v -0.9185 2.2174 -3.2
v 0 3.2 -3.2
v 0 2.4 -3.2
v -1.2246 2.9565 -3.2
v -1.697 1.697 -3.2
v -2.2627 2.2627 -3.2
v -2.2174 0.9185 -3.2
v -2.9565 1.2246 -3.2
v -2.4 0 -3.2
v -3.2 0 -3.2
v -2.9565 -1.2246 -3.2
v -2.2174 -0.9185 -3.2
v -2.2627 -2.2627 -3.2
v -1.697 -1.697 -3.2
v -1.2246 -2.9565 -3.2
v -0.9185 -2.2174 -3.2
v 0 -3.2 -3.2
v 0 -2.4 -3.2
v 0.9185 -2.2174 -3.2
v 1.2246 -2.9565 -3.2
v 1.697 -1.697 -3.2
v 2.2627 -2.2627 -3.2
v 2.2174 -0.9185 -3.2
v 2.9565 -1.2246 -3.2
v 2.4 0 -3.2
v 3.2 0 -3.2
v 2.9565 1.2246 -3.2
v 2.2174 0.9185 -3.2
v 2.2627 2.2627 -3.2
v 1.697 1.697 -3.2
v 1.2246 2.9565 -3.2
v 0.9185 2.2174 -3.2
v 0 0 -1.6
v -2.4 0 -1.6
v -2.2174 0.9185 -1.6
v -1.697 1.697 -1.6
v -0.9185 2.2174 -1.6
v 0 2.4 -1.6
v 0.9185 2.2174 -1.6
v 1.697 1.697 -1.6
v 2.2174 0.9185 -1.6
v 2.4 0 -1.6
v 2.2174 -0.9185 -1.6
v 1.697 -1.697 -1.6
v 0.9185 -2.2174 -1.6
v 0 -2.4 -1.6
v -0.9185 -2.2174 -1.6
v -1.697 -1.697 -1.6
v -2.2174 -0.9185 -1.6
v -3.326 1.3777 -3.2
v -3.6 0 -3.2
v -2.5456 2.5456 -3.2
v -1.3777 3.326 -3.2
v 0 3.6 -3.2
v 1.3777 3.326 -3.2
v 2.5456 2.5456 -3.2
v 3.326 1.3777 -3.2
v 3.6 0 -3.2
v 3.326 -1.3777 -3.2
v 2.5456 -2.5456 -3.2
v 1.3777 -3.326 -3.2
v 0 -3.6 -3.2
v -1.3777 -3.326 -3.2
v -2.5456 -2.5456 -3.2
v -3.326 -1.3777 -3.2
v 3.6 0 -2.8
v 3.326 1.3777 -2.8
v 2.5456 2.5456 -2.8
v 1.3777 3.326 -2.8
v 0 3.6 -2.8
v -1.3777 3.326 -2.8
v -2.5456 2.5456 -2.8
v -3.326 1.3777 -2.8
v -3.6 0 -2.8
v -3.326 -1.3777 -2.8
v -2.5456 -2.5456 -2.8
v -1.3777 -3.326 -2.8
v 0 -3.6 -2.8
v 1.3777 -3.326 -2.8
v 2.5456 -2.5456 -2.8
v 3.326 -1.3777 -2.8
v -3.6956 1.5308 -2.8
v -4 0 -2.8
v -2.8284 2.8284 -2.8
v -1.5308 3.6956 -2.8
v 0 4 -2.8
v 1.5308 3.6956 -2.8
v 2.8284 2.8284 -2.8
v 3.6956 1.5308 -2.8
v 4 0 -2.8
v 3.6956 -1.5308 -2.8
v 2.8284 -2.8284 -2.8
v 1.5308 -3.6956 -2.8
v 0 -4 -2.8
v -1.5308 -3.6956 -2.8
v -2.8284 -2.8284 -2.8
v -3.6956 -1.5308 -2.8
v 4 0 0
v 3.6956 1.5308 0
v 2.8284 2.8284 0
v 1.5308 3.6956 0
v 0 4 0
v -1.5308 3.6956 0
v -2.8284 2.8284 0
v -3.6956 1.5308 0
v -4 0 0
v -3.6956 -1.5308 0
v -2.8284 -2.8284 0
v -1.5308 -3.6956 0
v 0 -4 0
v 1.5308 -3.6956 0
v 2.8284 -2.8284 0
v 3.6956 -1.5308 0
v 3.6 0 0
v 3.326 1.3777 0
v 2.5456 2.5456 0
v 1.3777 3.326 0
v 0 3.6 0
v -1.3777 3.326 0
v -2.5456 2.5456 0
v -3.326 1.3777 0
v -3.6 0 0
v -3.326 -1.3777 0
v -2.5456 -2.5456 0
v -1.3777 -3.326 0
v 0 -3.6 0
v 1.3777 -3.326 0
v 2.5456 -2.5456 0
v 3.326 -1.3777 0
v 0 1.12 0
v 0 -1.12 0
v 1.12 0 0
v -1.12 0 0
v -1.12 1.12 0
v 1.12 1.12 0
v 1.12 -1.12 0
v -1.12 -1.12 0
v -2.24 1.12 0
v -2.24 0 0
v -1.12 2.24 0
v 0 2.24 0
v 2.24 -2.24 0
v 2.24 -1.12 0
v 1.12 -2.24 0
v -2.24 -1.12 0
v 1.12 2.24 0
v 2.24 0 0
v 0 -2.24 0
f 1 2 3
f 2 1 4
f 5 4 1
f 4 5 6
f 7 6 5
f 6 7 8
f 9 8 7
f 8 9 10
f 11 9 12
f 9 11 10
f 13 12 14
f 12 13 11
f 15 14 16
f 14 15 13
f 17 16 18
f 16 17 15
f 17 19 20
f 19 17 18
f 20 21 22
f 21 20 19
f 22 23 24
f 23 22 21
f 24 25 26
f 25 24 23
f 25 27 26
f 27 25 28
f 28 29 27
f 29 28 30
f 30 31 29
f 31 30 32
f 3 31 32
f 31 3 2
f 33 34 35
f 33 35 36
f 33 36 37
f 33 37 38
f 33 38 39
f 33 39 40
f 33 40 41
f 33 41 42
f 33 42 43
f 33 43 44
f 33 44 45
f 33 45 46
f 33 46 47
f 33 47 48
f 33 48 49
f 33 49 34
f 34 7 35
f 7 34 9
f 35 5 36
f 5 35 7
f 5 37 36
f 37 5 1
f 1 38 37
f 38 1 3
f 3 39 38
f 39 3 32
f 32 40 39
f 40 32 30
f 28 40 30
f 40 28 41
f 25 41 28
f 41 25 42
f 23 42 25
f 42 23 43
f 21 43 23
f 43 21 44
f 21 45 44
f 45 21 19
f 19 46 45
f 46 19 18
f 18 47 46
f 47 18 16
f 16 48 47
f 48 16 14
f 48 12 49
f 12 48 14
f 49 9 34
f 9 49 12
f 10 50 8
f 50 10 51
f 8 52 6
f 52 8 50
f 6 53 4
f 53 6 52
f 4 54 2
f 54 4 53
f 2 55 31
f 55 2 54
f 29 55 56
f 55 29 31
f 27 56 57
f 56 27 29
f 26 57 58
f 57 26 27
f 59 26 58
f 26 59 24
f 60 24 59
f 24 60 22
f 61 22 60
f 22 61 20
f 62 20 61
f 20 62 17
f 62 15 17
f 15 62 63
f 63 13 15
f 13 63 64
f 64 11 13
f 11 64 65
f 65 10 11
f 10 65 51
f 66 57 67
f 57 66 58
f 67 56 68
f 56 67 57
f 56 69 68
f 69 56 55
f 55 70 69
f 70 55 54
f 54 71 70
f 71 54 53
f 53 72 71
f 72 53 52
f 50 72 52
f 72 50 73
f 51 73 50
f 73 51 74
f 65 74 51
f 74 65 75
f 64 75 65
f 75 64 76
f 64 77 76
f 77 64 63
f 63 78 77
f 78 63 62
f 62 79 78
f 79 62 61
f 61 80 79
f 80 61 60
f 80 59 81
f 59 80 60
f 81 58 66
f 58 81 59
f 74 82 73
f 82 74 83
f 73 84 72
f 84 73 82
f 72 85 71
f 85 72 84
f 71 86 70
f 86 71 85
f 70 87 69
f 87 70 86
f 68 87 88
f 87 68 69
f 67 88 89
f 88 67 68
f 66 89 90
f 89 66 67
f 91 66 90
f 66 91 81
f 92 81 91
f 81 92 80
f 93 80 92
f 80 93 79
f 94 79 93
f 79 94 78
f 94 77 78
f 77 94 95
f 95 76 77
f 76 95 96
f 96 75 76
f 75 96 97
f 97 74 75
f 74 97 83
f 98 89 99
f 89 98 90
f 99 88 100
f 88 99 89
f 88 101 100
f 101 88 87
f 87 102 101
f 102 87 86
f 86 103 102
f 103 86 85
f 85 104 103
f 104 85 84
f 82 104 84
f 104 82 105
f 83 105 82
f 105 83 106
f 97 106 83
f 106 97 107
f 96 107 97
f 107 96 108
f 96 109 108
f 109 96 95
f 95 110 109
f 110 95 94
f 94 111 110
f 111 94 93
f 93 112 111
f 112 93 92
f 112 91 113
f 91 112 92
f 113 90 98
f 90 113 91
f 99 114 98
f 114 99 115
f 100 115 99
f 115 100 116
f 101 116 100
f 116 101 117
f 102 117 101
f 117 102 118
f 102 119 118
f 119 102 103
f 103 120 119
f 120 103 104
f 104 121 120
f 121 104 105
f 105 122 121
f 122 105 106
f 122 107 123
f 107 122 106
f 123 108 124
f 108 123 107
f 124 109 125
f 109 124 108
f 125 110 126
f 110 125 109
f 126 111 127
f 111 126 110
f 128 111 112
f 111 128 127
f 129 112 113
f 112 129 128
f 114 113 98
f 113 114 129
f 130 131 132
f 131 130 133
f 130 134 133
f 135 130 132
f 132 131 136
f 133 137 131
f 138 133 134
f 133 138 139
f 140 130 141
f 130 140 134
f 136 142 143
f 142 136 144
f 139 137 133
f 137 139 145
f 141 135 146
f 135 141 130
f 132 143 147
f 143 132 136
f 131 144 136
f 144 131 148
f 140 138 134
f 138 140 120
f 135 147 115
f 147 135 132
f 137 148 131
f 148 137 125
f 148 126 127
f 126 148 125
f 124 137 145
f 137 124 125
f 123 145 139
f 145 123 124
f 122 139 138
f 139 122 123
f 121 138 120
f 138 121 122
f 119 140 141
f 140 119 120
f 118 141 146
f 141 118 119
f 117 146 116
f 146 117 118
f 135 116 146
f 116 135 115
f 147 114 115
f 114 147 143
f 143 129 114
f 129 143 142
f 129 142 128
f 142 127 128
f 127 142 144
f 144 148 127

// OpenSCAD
// file: ../p/4-4disc.scad
use <../lib.scad>
function ldraw_lib__4_4disc() = [
// 0 Disc 1.0
// 0 Name: 4-4disc.dat
// 0 Author: James Jessiman
// 0 !LDRAW_ORG Primitive UPDATE 2002-02
// 0 !LICENSE Licensed under CC BY 4.0 : see CAreadme.txt
// 
// 0 BFC CERTIFY CCW
  [0,"BFC","CERTIFY"],
  [0,"BFC","CCW"],
// 
// 0 !HISTORY 1998-12-15 [PTadmin] Official Update 1998-10
// 0 !HISTORY 2002-03-23 [sbliss] Added BFC statement
// 0 !HISTORY 2002-04-25 [PTadmin] Official Update 2002-02
// 0 !HISTORY 2007-06-24 [PTadmin] Header formatted for Contributor Agreement
// 0 !HISTORY 2008-07-01 [PTadmin] Official Update 2008-01
// 
// 
// 3 16 0 0 0 1 0 0 0.9239 0 0.3827
  [3,16,0,0,0,1,0,0,0.9239,0,0.3827],
// 3 16 0 0 0 0.9239 0 0.3827 0.7071 0 0.7071
  [3,16,0,0,0,0.9239,0,0.3827,0.7071,0,0.7071],
// 3 16 0 0 0 0.7071 0 0.7071 0.3827 0 0.9239
  [3,16,0,0,0,0.7071,0,0.7071,0.3827,0,0.9239],
// 3 16 0 0 0 0.3827 0 0.9239 0 0 1
  [3,16,0,0,0,0.3827,0,0.9239,0,0,1],
// 3 16 0 0 0 0 0 1 -0.3827 0 0.9239
  [3,16,0,0,0,0,0,1,-0.3827,0,0.9239],
// 3 16 0 0 0 -0.3827 0 0.9239 -0.7071 0 0.7071
  [3,16,0,0,0,-0.3827,0,0.9239,-0.7071,0,0.7071],
// 3 16 0 0 0 -0.7071 0 0.7071 -0.9239 0 0.3827
  [3,16,0,0,0,-0.7071,0,0.7071,-0.9239,0,0.3827],
// 3 16 0 0 0 -0.9239 0 0.3827 -1 0 -0
  [3,16,0,0,0,-0.9239,0,0.3827,-1,0,-0],
// 3 16 0 0 0 -1 0 -0 -0.9239 0 -0.3827
  [3,16,0,0,0,-1,0,-0,-0.9239,0,-0.3827],
// 3 16 0 0 0 -0.9239 0 -0.3827 -0.7071 0 -0.7071
  [3,16,0,0,0,-0.9239,0,-0.3827,-0.7071,0,-0.7071],
// 3 16 0 0 0 -0.7071 0 -0.7071 -0.3827 0 -0.9239
  [3,16,0,0,0,-0.7071,0,-0.7071,-0.3827,0,-0.9239],
// 3 16 0 0 0 -0.3827 0 -0.9239 0 0 -1
  [3,16,0,0,0,-0.3827,0,-0.9239,0,0,-1],
// 3 16 0 0 0 0 0 -1 0.3827 0 -0.9239
  [3,16,0,0,0,0,0,-1,0.3827,0,-0.9239],
// 3 16 0 0 0 0.3827 0 -0.9239 0.7071 0 -0.7071
  [3,16,0,0,0,0.3827,0,-0.9239,0.7071,0,-0.7071],
// 3 16 0 0 0 0.7071 0 -0.7071 0.9239 0 -0.3827
  [3,16,0,0,0,0.7071,0,-0.7071,0.9239,0,-0.3827],
// 3 16 0 0 0 0.9239 0 -0.3827 1 0 0
  [3,16,0,0,0,0.9239,0,-0.3827,1,0,0],
// 0
];
module ldraw_lib__4_4disc(step=0, col=false, unit=2/5, alt=false, line=0.2, solid=!$preview)
    makepoly(ldraw_lib__4_4disc(), step=step, col=col, unit=unit, alt=alt, line=line, solid=solid);
ldraw_lib__4_4disc(line=0.2);
// file: ../p/4-4ring3.scad
use <../lib.scad>
function ldraw_lib__4_4ring3() = [
// 0 Ring  3 x 1.0
// 0 Name: 4-4ring3.dat
// 0 Author: James Jessiman
// 0 !LDRAW_ORG Primitive UPDATE 2009-01
// 0 !LICENSE Licensed under CC BY 4.0 : see CAreadme.txt
// 
// 0 BFC CERTIFY CCW
  [0,"BFC","CERTIFY"],
  [0,"BFC","CCW"],
// 
// 0 !HISTORY 1998-12-15 [PTadmin] Official Update 1998-10
// 0 !HISTORY 2002-04-05 [hafhead] Added BFC statement
// 0 !HISTORY 2002-04-25 [PTadmin] Official Update 2002-02
// 0 !HISTORY 2007-06-24 [PTadmin] Header formatted for Contributor Agreement
// 0 !HISTORY 2008-07-01 [PTadmin] Official Update 2008-01
// 0 !HISTORY 2008-08-26 [cwdee] Switch polygon winding and rename
// 0 !HISTORY 2009-05-02 [PTadmin] Official Update 2009-01
// 
// 
// 4 16 -1.5308 0 3.6956 -1.1481 0 2.7717 0 0 3 0 0 4
  [4,16,-1.5308,0,3.6956,-1.1481,0,2.7717,0,0,3,0,0,4],
// 4 16 -2.8284 0 2.8284 -2.1213 0 2.1213 -1.1481 0 2.7717 -1.5308 0 3.6956
  [4,16,-2.8284,0,2.8284,-2.1213,0,2.1213,-1.1481,0,2.7717,-1.5308,0,3.6956],
// 4 16 -3.6956 0 1.5308 -2.7717 0 1.1481 -2.1213 0 2.1213 -2.8284 0 2.8284
  [4,16,-3.6956,0,1.5308,-2.7717,0,1.1481,-2.1213,0,2.1213,-2.8284,0,2.8284],
// 4 16 -4 0 0 -3 0 0 -2.7717 0 1.1481 -3.6956 0 1.5308
  [4,16,-4,0,0,-3,0,0,-2.7717,0,1.1481,-3.6956,0,1.5308],
// 4 16 -3.6956 0 -1.5308 -2.7717 0 -1.1481 -3 0 0 -4 0 0
  [4,16,-3.6956,0,-1.5308,-2.7717,0,-1.1481,-3,0,0,-4,0,0],
// 4 16 -2.8284 0 -2.8284 -2.1213 0 -2.1213 -2.7717 0 -1.1481 -3.6956 0 -1.5308
  [4,16,-2.8284,0,-2.8284,-2.1213,0,-2.1213,-2.7717,0,-1.1481,-3.6956,0,-1.5308],
// 4 16 -1.5308 0 -3.6956 -1.1481 0 -2.7717 -2.1213 0 -2.1213 -2.8284 0 -2.8284
  [4,16,-1.5308,0,-3.6956,-1.1481,0,-2.7717,-2.1213,0,-2.1213,-2.8284,0,-2.8284],
// 4 16 0 0 -4 0 0 -3 -1.1481 0 -2.7717 -1.5308 0 -3.6956
  [4,16,0,0,-4,0,0,-3,-1.1481,0,-2.7717,-1.5308,0,-3.6956],
// 4 16 1.5308 0 -3.6956 1.1481 0 -2.7717 0 0 -3 0 0 -4
  [4,16,1.5308,0,-3.6956,1.1481,0,-2.7717,0,0,-3,0,0,-4],
// 4 16 2.8284 0 -2.8284 2.1213 0 -2.1213 1.1481 0 -2.7717 1.5308 0 -3.6956
  [4,16,2.8284,0,-2.8284,2.1213,0,-2.1213,1.1481,0,-2.7717,1.5308,0,-3.6956],
// 4 16 3.6956 0 -1.5308 2.7717 0 -1.1481 2.1213 0 -2.1213 2.8284 0 -2.8284
  [4,16,3.6956,0,-1.5308,2.7717,0,-1.1481,2.1213,0,-2.1213,2.8284,0,-2.8284],
// 4 16 4 0 0 3 0 0 2.7717 0 -1.1481 3.6956 0 -1.5308
  [4,16,4,0,0,3,0,0,2.7717,0,-1.1481,3.6956,0,-1.5308],
// 4 16 3.6956 0 1.5308 2.7717 0 1.1481 3 0 0 4 0 0
  [4,16,3.6956,0,1.5308,2.7717,0,1.1481,3,0,0,4,0,0],
// 4 16 2.8284 0 2.8284 2.1213 0 2.1213 2.7717 0 1.1481 3.6956 0 1.5308
  [4,16,2.8284,0,2.8284,2.1213,0,2.1213,2.7717,0,1.1481,3.6956,0,1.5308],
// 4 16 1.5308 0 3.6956 1.1481 0 2.7717 2.1213 0 2.1213 2.8284 0 2.8284
  [4,16,1.5308,0,3.6956,1.1481,0,2.7717,2.1213,0,2.1213,2.8284,0,2.8284],
// 4 16 0 0 4 0 0 3 1.1481 0 2.7717 1.5308 0 3.6956
  [4,16,0,0,4,0,0,3,1.1481,0,2.7717,1.5308,0,3.6956],
// 0
];
module ldraw_lib__4_4ring3(step=0, col=false, unit=2/5, alt=false, line=0.2, solid=!$preview)
    makepoly(ldraw_lib__4_4ring3(), step=step, col=col, unit=unit, alt=alt, line=line, solid=solid);
ldraw_lib__4_4ring3(line=0.2);
// file: ../p/4-4cylc.scad
use <../lib.scad>
use <4-4cyli.scad>
use <4-4disc.scad>
use <4-4edge.scad>
function ldraw_lib__4_4cylc() = [
// 0 Cylinder Closed 1.0
// 0 Name: 4-4cylc.dat
// 0 Author: Alex Taylor [anathema]
// 0 !LDRAW_ORG Primitive UPDATE 2009-02
// 0 !LICENSE Licensed under CC BY 4.0 : see CAreadme.txt
// 
// 0 BFC CERTIFY CCW
  [0,"BFC","CERTIFY"],
  [0,"BFC","CCW"],
// 
// 0 !HISTORY 2008-12-29 [cwdee] Removed one disc
// 0 !HISTORY 2009-09-03 [PTadmin] Official Update 2009-02
// 
// 
// 1 16 0 0 0 1 0 0 0 1 0 0 0 1 4-4edge.dat
  [1,16,0,0,0,1,0,0,0,1,0,0,0,1, ldraw_lib__4_4edge()],
// 1 16 0 1 0 1 0 0 0 1 0 0 0 1 4-4edge.dat
  [1,16,0,1,0,1,0,0,0,1,0,0,0,1, ldraw_lib__4_4edge()],
// 1 16 0 0 0 1 0 0 0 1 0 0 0 1 4-4disc.dat
  [1,16,0,0,0,1,0,0,0,1,0,0,0,1, ldraw_lib__4_4disc()],
// 1 16 0 0 0 1 0 0 0 1 0 0 0 1 4-4cyli.dat
  [1,16,0,0,0,1,0,0,0,1,0,0,0,1, ldraw_lib__4_4cyli()],
// 0
];
module ldraw_lib__4_4cylc(step=0, col=false, unit=2/5, alt=false, line=0.2, solid=!$preview)
    makepoly(ldraw_lib__4_4cylc(), step=step, col=col, unit=unit, alt=alt, line=line, solid=solid);
ldraw_lib__4_4cylc(line=0.2);
// file: ../p/4-4edge.scad
use <../lib.scad>
function ldraw_lib__4_4edge() = [
// 0 Circle 1.0
// 0 Name: 4-4edge.dat
// 0 Author: James Jessiman
// 0 !LDRAW_ORG Primitive UPDATE 2017-01
// 0 !LICENSE Licensed under CC BY 4.0 : see CAreadme.txt
// 
// 0 BFC CERTIFY CCW
  [0,"BFC","CERTIFY"],
  [0,"BFC","CCW"],
// 
// 0 !HISTORY 1998-12-15 [PTadmin] Official Update 1998-10
// 0 !HISTORY 2005-12-28 [PTadmin] Official Update 2005-01
// 0 !HISTORY 2007-06-24 [PTadmin] Header formatted for Contributor Agreement
// 0 !HISTORY 2008-07-01 [PTadmin] Official Update 2008-01
// 0 !HISTORY 2017-01-15 [Steffen] BFCed
// 0 !HISTORY 2017-12-30 [PTadmin] Official Update 2017-01
// 
// 
// 2 24 1 0 0 0.9239 0 0.3827
  [2,24,1,0,0,0.9239,0,0.3827],
// 2 24 0.9239 0 0.3827 0.7071 0 0.7071
  [2,24,0.9239,0,0.3827,0.7071,0,0.7071],
// 2 24 0.7071 0 0.7071 0.3827 0 0.9239
  [2,24,0.7071,0,0.7071,0.3827,0,0.9239],
// 2 24 0.3827 0 0.9239 0 0 1
  [2,24,0.3827,0,0.9239,0,0,1],
// 2 24 0 0 1 -0.3827 0 0.9239
  [2,24,0,0,1,-0.3827,0,0.9239],
// 2 24 -0.3827 0 0.9239 -0.7071 0 0.7071
  [2,24,-0.3827,0,0.9239,-0.7071,0,0.7071],
// 2 24 -0.7071 0 0.7071 -0.9239 0 0.3827
  [2,24,-0.7071,0,0.7071,-0.9239,0,0.3827],
// 2 24 -0.9239 0 0.3827 -1 0 -0
  [2,24,-0.9239,0,0.3827,-1,0,-0],
// 2 24 -1 0 -0 -0.9239 0 -0.3827
  [2,24,-1,0,-0,-0.9239,0,-0.3827],
// 2 24 -0.9239 0 -0.3827 -0.7071 0 -0.7071
  [2,24,-0.9239,0,-0.3827,-0.7071,0,-0.7071],
// 2 24 -0.7071 0 -0.7071 -0.3827 0 -0.9239
  [2,24,-0.7071,0,-0.7071,-0.3827,0,-0.9239],
// 2 24 -0.3827 0 -0.9239 0 0 -1
  [2,24,-0.3827,0,-0.9239,0,0,-1],
// 2 24 0 0 -1 0.3827 0 -0.9239
  [2,24,0,0,-1,0.3827,0,-0.9239],
// 2 24 0.3827 0 -0.9239 0.7071 0 -0.7071
  [2,24,0.3827,0,-0.9239,0.7071,0,-0.7071],
// 2 24 0.7071 0 -0.7071 0.9239 0 -0.3827
  [2,24,0.7071,0,-0.7071,0.9239,0,-0.3827],
// 2 24 0.9239 0 -0.3827 1 0 0
  [2,24,0.9239,0,-0.3827,1,0,0],
];
module ldraw_lib__4_4edge(step=0, col=false, unit=2/5, alt=false, line=0.2, solid=!$preview)
    makepoly(ldraw_lib__4_4edge(), step=step, col=col, unit=unit, alt=alt, line=line, solid=solid);
ldraw_lib__4_4edge(line=0.2);
// file: ../p/4-4cyli.scad
use <../lib.scad>
function ldraw_lib__4_4cyli() = [
// 0 Cylinder 1.0
// 0 Name: 4-4cyli.dat
// 0 Author: James Jessiman
// 0 !LDRAW_ORG Primitive UPDATE 2005-01
// 0 !LICENSE Licensed under CC BY 4.0 : see CAreadme.txt
// 
// 0 BFC CERTIFY CCW
  [0,"BFC","CERTIFY"],
  [0,"BFC","CCW"],
// 
// 0 !HISTORY 1998-12-15 [PTadmin] Official Update 1998-10
// 0 !HISTORY 2002-03-23 [sbliss] Added BFC statement; merged headers from files in distributions LDraw 0.27 and Complete.
// 0 !HISTORY 2002-04-25 [PTadmin] Official Update 2002-02
// 0 !HISTORY 2004-12-14 [guyvivan] BFC CCW
// 0 !HISTORY 2005-12-28 [PTadmin] Official Update 2005-01
// 0 !HISTORY 2007-06-24 [PTadmin] Header formatted for Contributor Agreement
// 0 !HISTORY 2008-07-01 [PTadmin] Official Update 2008-01
// 
// 
// 4 16 1 1 0 0.9239 1 0.3827 0.9239 0 0.3827 1 0 0
  [4,16,1,1,0,0.9239,1,0.3827,0.9239,0,0.3827,1,0,0],
// 5 24 1 0 0 1 1 0 0.9239 0 0.3827 0.9239 0 -0.3827
  [5,24,1,0,0,1,1,0,0.9239,0,0.3827,0.9239,0,-0.3827],
// 4 16 0.9239 1 0.3827 0.7071 1 0.7071 0.7071 0 0.7071 0.9239 0 0.3827
  [4,16,0.9239,1,0.3827,0.7071,1,0.7071,0.7071,0,0.7071,0.9239,0,0.3827],
// 5 24 0.9239 0 0.3827 0.9239 1 0.3827 0.7071 0 0.7071 1 0 0
  [5,24,0.9239,0,0.3827,0.9239,1,0.3827,0.7071,0,0.7071,1,0,0],
// 4 16 0.7071 1 0.7071 0.3827 1 0.9239 0.3827 0 0.9239 0.7071 0 0.7071
  [4,16,0.7071,1,0.7071,0.3827,1,0.9239,0.3827,0,0.9239,0.7071,0,0.7071],
// 5 24 0.7071 0 0.7071 0.7071 1 0.7071 0.3827 0 0.9239 0.9239 0 0.3827
  [5,24,0.7071,0,0.7071,0.7071,1,0.7071,0.3827,0,0.9239,0.9239,0,0.3827],
// 4 16 0.3827 1 0.9239 0 1 1 0 0 1 0.3827 0 0.9239
  [4,16,0.3827,1,0.9239,0,1,1,0,0,1,0.3827,0,0.9239],
// 5 24 0.3827 0 0.9239 0.3827 1 0.9239 0 0 1 0.7071 0 0.7071
  [5,24,0.3827,0,0.9239,0.3827,1,0.9239,0,0,1,0.7071,0,0.7071],
// 4 16 0 1 1 -0.3827 1 0.9239 -0.3827 0 0.9239 0 0 1
  [4,16,0,1,1,-0.3827,1,0.9239,-0.3827,0,0.9239,0,0,1],
// 5 24 0 0 1 0 1 1 -0.3827 0 0.9239 0.3827 0 0.9239
  [5,24,0,0,1,0,1,1,-0.3827,0,0.9239,0.3827,0,0.9239],
// 4 16 -0.3827 1 0.9239 -0.7071 1 0.7071 -0.7071 0 0.7071 -0.3827 0 0.9239
  [4,16,-0.3827,1,0.9239,-0.7071,1,0.7071,-0.7071,0,0.7071,-0.3827,0,0.9239],
// 5 24 -0.3827 0 0.9239 -0.3827 1 0.9239 -0.7071 0 0.7071 0 0 1
  [5,24,-0.3827,0,0.9239,-0.3827,1,0.9239,-0.7071,0,0.7071,0,0,1],
// 4 16 -0.7071 1 0.7071 -0.9239 1 0.3827 -0.9239 0 0.3827 -0.7071 0 0.7071
  [4,16,-0.7071,1,0.7071,-0.9239,1,0.3827,-0.9239,0,0.3827,-0.7071,0,0.7071],
// 5 24 -0.7071 0 0.7071 -0.7071 1 0.7071 -0.9239 0 0.3827 -0.3827 0 0.9239
  [5,24,-0.7071,0,0.7071,-0.7071,1,0.7071,-0.9239,0,0.3827,-0.3827,0,0.9239],
// 4 16 -0.9239 1 0.3827 -1 1 0 -1 0 0 -0.9239 0 0.3827
  [4,16,-0.9239,1,0.3827,-1,1,0,-1,0,0,-0.9239,0,0.3827],
// 5 24 -0.9239 0 0.3827 -0.9239 1 0.3827 -1 0 0 -0.7071 0 0.7071
  [5,24,-0.9239,0,0.3827,-0.9239,1,0.3827,-1,0,0,-0.7071,0,0.7071],
// 4 16 -1 1 0 -0.9239 1 -0.3827 -0.9239 0 -0.3827 -1 0 0
  [4,16,-1,1,0,-0.9239,1,-0.3827,-0.9239,0,-0.3827,-1,0,0],
// 5 24 -1 0 0 -1 1 0 -0.9239 0 -0.3827 -0.9239 0 0.3827
  [5,24,-1,0,0,-1,1,0,-0.9239,0,-0.3827,-0.9239,0,0.3827],
// 4 16 -0.9239 1 -0.3827 -0.7071 1 -0.7071 -0.7071 0 -0.7071 -0.9239 0 -0.3827
  [4,16,-0.9239,1,-0.3827,-0.7071,1,-0.7071,-0.7071,0,-0.7071,-0.9239,0,-0.3827],
// 5 24 -0.9239 0 -0.3827 -0.9239 1 -0.3827 -0.7071 0 -0.7071 -1 0 0
  [5,24,-0.9239,0,-0.3827,-0.9239,1,-0.3827,-0.7071,0,-0.7071,-1,0,0],
// 4 16 -0.7071 1 -0.7071 -0.3827 1 -0.9239 -0.3827 0 -0.9239 -0.7071 0 -0.7071
  [4,16,-0.7071,1,-0.7071,-0.3827,1,-0.9239,-0.3827,0,-0.9239,-0.7071,0,-0.7071],
// 5 24 -0.7071 0 -0.7071 -0.7071 1 -0.7071 -0.3827 0 -0.9239 -0.9239 0 -0.3827
  [5,24,-0.7071,0,-0.7071,-0.7071,1,-0.7071,-0.3827,0,-0.9239,-0.9239,0,-0.3827],
// 4 16 -0.3827 1 -0.9239 0 1 -1 0 0 -1 -0.3827 0 -0.9239
  [4,16,-0.3827,1,-0.9239,0,1,-1,0,0,-1,-0.3827,0,-0.9239],
// 5 24 -0.3827 0 -0.9239 -0.3827 1 -0.9239 0 0 -1 -0.7071 0 -0.7071
  [5,24,-0.3827,0,-0.9239,-0.3827,1,-0.9239,0,0,-1,-0.7071,0,-0.7071],
// 4 16 0 1 -1 0.3827 1 -0.9239 0.3827 0 -0.9239 0 0 -1
  [4,16,0,1,-1,0.3827,1,-0.9239,0.3827,0,-0.9239,0,0,-1],
// 5 24 0 0 -1 0 1 -1 0.3827 0 -0.9239 -0.3827 0 -0.9239
  [5,24,0,0,-1,0,1,-1,0.3827,0,-0.9239,-0.3827,0,-0.9239],
// 4 16 0.3827 1 -0.9239 0.7071 1 -0.7071 0.7071 0 -0.7071 0.3827 0 -0.9239
  [4,16,0.3827,1,-0.9239,0.7071,1,-0.7071,0.7071,0,-0.7071,0.3827,0,-0.9239],
// 5 24 0.3827 0 -0.9239 0.3827 1 -0.9239 0.7071 0 -0.7071 0 0 -1
  [5,24,0.3827,0,-0.9239,0.3827,1,-0.9239,0.7071,0,-0.7071,0,0,-1],
// 4 16 0.7071 1 -0.7071 0.9239 1 -0.3827 0.9239 0 -0.3827 0.7071 0 -0.7071
  [4,16,0.7071,1,-0.7071,0.9239,1,-0.3827,0.9239,0,-0.3827,0.7071,0,-0.7071],
// 5 24 0.7071 0 -0.7071 0.7071 1 -0.7071 0.9239 0 -0.3827 0.3827 0 -0.9239
  [5,24,0.7071,0,-0.7071,0.7071,1,-0.7071,0.9239,0,-0.3827,0.3827,0,-0.9239],
// 4 16 0.9239 1 -0.3827 1 1 0 1 0 0 0.9239 0 -0.3827
  [4,16,0.9239,1,-0.3827,1,1,0,1,0,0,0.9239,0,-0.3827],
// 5 24 0.9239 0 -0.3827 0.9239 1 -0.3827 1 0 0 0.7071 0 -0.7071
  [5,24,0.9239,0,-0.3827,0.9239,1,-0.3827,1,0,0,0.7071,0,-0.7071],
// 0
];
module ldraw_lib__4_4cyli(step=0, col=false, unit=2/5, alt=false, line=0.2, solid=!$preview)
    makepoly(ldraw_lib__4_4cyli(), step=step, col=col, unit=unit, alt=alt, line=line, solid=solid);
ldraw_lib__4_4cyli(line=0.2);
// file: ../p/stud4o.scad
use <../lib.scad>
use <4-4cylc.scad>
use <4-4ring3.scad>
function ldraw_lib__stud4o() = [
// 0 Stud Tube Open without Outer Cylinder
// 0 Name: stud4o.dat
// 0 Author: Magnus Forsberg [MagFors]
// 0 !LDRAW_ORG Primitive UPDATE 2011-02
// 0 !LICENSE Licensed under CC BY 4.0 : see CAreadme.txt
// 
// 0 !HELP This stud is a "antistud" to be used like a underside stud,
// 0 !HELP but without the outer cylinder.
// 0 !HELP 1 47 0 0 0 1 0 0 0 1 0 0 0 1 stud4.dat
// 
// 0 BFC CERTIFY CCW
  [0,"BFC","CERTIFY"],
  [0,"BFC","CCW"],
// 
// 0 !HISTORY 2011-12-29 [PTadmin] Official Update 2011-02
// 
// 
// 1 16 0 -4 0 2 0 0 0 1 0 0 0 2 4-4ring3.dat
  [1,16,0,-4,0,2,0,0,0,1,0,0,0,2, ldraw_lib__4_4ring3()],
// 0 BFC INVERTNEXT
  [0,"BFC","INVERTNEXT"],
// 1 16 0 0 0 -6 0 0 0 -4 0 0 0 6 4-4cylc.dat
  [1,16,0,0,0,-6,0,0,0,-4,0,0,0,6, ldraw_lib__4_4cylc()],
];
module ldraw_lib__stud4o(step=0, col=false, unit=2/5, alt=false, line=0.2, solid=!$preview)
    makepoly(ldraw_lib__stud4o(), step=step, col=col, unit=unit, alt=alt, line=line, solid=solid);
ldraw_lib__stud4o(line=0.2);
// file: ../p/4-4ring8.scad
use <../lib.scad>
function ldraw_lib__4_4ring8() = [
// 0 Ring  8 x 1.0
// 0 Name: 4-4ring8.dat
// 0 Author: Steffen [Steffen]
// 0 !LDRAW_ORG Primitive UPDATE 2012-01
// 0 !LICENSE Licensed under CC BY 4.0 : see CAreadme.txt
// 
// 0 BFC CERTIFY CCW
  [0,"BFC","CERTIFY"],
  [0,"BFC","CCW"],
// 
// 0 !HISTORY 2003-12-19 [PTadmin] Official Update 2003-03
// 0 !HISTORY 2007-06-24 [PTadmin] Header formatted for Contributor Agreement
// 0 !HISTORY 2008-07-01 [PTadmin] Official Update 2008-01
// 0 !HISTORY 2012-02-16 [Philo] Changed to CCW
// 0 !HISTORY 2012-03-30 [PTadmin] Official Update 2012-01
// 
// 
// 4 16 9 0 0 8.3151 0 3.4443 7.3912 0 3.0616 8 0 0
  [4,16,9,0,0,8.3151,0,3.4443,7.3912,0,3.0616,8,0,0],
// 4 16 8.3151 0 3.4443 6.3639 0 6.3639 5.6568 0 5.6568 7.3912 0 3.0616
  [4,16,8.3151,0,3.4443,6.3639,0,6.3639,5.6568,0,5.6568,7.3912,0,3.0616],
// 4 16 6.3639 0 6.3639 3.4443 0 8.3151 3.0616 0 7.3912 5.6568 0 5.6568
  [4,16,6.3639,0,6.3639,3.4443,0,8.3151,3.0616,0,7.3912,5.6568,0,5.6568],
// 4 16 3.4443 0 8.3151 0 0 9 0 0 8 3.0616 0 7.3912
  [4,16,3.4443,0,8.3151,0,0,9,0,0,8,3.0616,0,7.3912],
// 4 16 0 0 9 -3.4443 0 8.3151 -3.0616 0 7.3912 0 0 8
  [4,16,0,0,9,-3.4443,0,8.3151,-3.0616,0,7.3912,0,0,8],
// 4 16 -3.4443 0 8.3151 -6.3639 0 6.3639 -5.6568 0 5.6568 -3.0616 0 7.3912
  [4,16,-3.4443,0,8.3151,-6.3639,0,6.3639,-5.6568,0,5.6568,-3.0616,0,7.3912],
// 4 16 -6.3639 0 6.3639 -8.3151 0 3.4443 -7.3912 0 3.0616 -5.6568 0 5.6568
  [4,16,-6.3639,0,6.3639,-8.3151,0,3.4443,-7.3912,0,3.0616,-5.6568,0,5.6568],
// 4 16 -8.3151 0 3.4443 -9 0 0 -8 0 0 -7.3912 0 3.0616
  [4,16,-8.3151,0,3.4443,-9,0,0,-8,0,0,-7.3912,0,3.0616],
// 4 16 -9 0 0 -8.3151 0 -3.4443 -7.3912 0 -3.0616 -8 0 0
  [4,16,-9,0,0,-8.3151,0,-3.4443,-7.3912,0,-3.0616,-8,0,0],
// 4 16 -8.3151 0 -3.4443 -6.3639 0 -6.3639 -5.6568 0 -5.6568 -7.3912 0 -3.0616
  [4,16,-8.3151,0,-3.4443,-6.3639,0,-6.3639,-5.6568,0,-5.6568,-7.3912,0,-3.0616],
// 4 16 -6.3639 0 -6.3639 -3.4443 0 -8.3151 -3.0616 0 -7.3912 -5.6568 0 -5.6568
  [4,16,-6.3639,0,-6.3639,-3.4443,0,-8.3151,-3.0616,0,-7.3912,-5.6568,0,-5.6568],
// 4 16 -3.4443 0 -8.3151 0 0 -9 0 0 -8 -3.0616 0 -7.3912
  [4,16,-3.4443,0,-8.3151,0,0,-9,0,0,-8,-3.0616,0,-7.3912],
// 4 16 0 0 -9 3.4443 0 -8.3151 3.0616 0 -7.3912 0 0 -8
  [4,16,0,0,-9,3.4443,0,-8.3151,3.0616,0,-7.3912,0,0,-8],
// 4 16 3.4443 0 -8.3151 6.3639 0 -6.3639 5.6568 0 -5.6568 3.0616 0 -7.3912
  [4,16,3.4443,0,-8.3151,6.3639,0,-6.3639,5.6568,0,-5.6568,3.0616,0,-7.3912],
// 4 16 6.3639 0 -6.3639 8.3151 0 -3.4443 7.3912 0 -3.0616 5.6568 0 -5.6568
  [4,16,6.3639,0,-6.3639,8.3151,0,-3.4443,7.3912,0,-3.0616,5.6568,0,-5.6568],
// 4 16 8.3151 0 -3.4443 9 0 0 8 0 0 7.3912 0 -3.0616
  [4,16,8.3151,0,-3.4443,9,0,0,8,0,0,7.3912,0,-3.0616],
];
module ldraw_lib__4_4ring8(step=0, col=false, unit=2/5, alt=false, line=0.2, solid=!$preview)
    makepoly(ldraw_lib__4_4ring8(), step=step, col=col, unit=unit, alt=alt, line=line, solid=solid);
ldraw_lib__4_4ring8(line=0.2);
// file: ../p/4-4cylo.scad
use <../lib.scad>
use <4-4cyli.scad>
use <4-4edge.scad>
function ldraw_lib__4_4cylo() = [
// 0 Cylinder Open 1.0
// 0 Name: 4-4cylo.dat
// 0 Author: Mark Kennedy [mkennedy]
// 0 !LDRAW_ORG Primitive UPDATE 2010-01
// 0 !LICENSE Licensed under CC BY 4.0 : see CAreadme.txt
// 
// 0 BFC CERTIFY CCW
  [0,"BFC","CERTIFY"],
  [0,"BFC","CCW"],
// 
// 0 !HISTORY 2010-04-05 [PTadmin] Official Update 2010-01
// 
// 
// 1 16 0 0 0 1 0 0 0 1 0 0 0 1 4-4edge.dat
  [1,16,0,0,0,1,0,0,0,1,0,0,0,1, ldraw_lib__4_4edge()],
// 1 16 0 1 0 1 0 0 0 1 0 0 0 1 4-4edge.dat
  [1,16,0,1,0,1,0,0,0,1,0,0,0,1, ldraw_lib__4_4edge()],
// 1 16 0 0 0 1 0 0 0 1 0 0 0 1 4-4cyli.dat
  [1,16,0,0,0,1,0,0,0,1,0,0,0,1, ldraw_lib__4_4cyli()],
// 0
];
module ldraw_lib__4_4cylo(step=0, col=false, unit=2/5, alt=false, line=0.2, solid=!$preview)
    makepoly(ldraw_lib__4_4cylo(), step=step, col=col, unit=unit, alt=alt, line=line, solid=solid);
ldraw_lib__4_4cylo(line=0.2);
// file: ../p/empty.scad
use <../lib.scad>
function ldraw_lib__empty() = [
// 0 Empty
// 0 Name: empty.dat
// 0 Author: Steffen [Steffen]
// 0 !LDRAW_ORG Primitive UPDATE 2015-01
// 0 !LICENSE Licensed under CC BY 4.0 : see CAreadme.txt
// 
// 0 BFC CERTIFY CCW
  [0,"BFC","CERTIFY"],
  [0,"BFC","CCW"],
// 
// 0 !HISTORY 2015-10-11 [PTadmin] Official Update 2015-01
// 
// 
// 0 // Tool MLCad cannot handle really empty files. This file is used as a workaround.
// 0 // It exceptionally contains forbidden non-LDRAW standard syntax to satisfy MLCad until it is fixed OR a different editor has become the de-facto LDRAW standard.
// 0 // The line being used here is an "impossible" conditional line which never should be visible,
// 0 // additionally hidden by a syntax explicitly hiding it from displaying.
// 
// 0 MLCAD HIDE 5 24 0 0 0 0.0001 0 0 0.0001 -0.0001 0 0 0 0
];
module ldraw_lib__empty(step=0, col=false, unit=2/5, alt=false, line=0.2, solid=!$preview)
    makepoly(ldraw_lib__empty(), step=step, col=col, unit=unit, alt=alt, line=line, solid=solid);
ldraw_lib__empty(line=0.2);
// file: s/98138s02.scad
use <../../lib.scad>
use <../../p/4-4cylo.scad>
use <../../p/4-4ring8.scad>
use <../../p/4-4ring9.scad>
use <../../p/stud4o.scad>
function ldraw_lib__s__98138s02() = [
// 0 ~Tile  1 x  1 Round with Groove without Complete Top Face
// 0 Name: s\98138s02.dat
// 0 Author: Magnus Forsberg [MagFors]
// 0 !LDRAW_ORG Subpart UPDATE 2020-01
// 0 !LICENSE Licensed under CC BY 4.0 : see CAreadme.txt
// 
// 0 BFC CERTIFY CCW
  [0,"BFC","CERTIFY"],
  [0,"BFC","CCW"],
// 
// 0 !HISTORY 2020-06-28 [PTadmin] Official Update 2020-01
// 
// 
// 1 16 0 4 0 1 0 0 0 -1 0 0 0 1 stud4o.dat
  [1,16,0,4,0,1,0,0,0,-1,0,0,0,1, ldraw_lib__stud4o()],
// 1 16 0 8 0 -1 0 0 0 -1 0 0 0 1 4-4ring8.dat
  [1,16,0,8,0,-1,0,0,0,-1,0,0,0,1, ldraw_lib__4_4ring8()],
// 1 16 0 7 0 9 0 0 0 1 0 0 0 9 4-4cylo.dat
  [1,16,0,7,0,9,0,0,0,1,0,0,0,9, ldraw_lib__4_4cylo()],
// 1 16 0 7 0 -1 0 0 0 -1 0 0 0 1 4-4ring9.dat
  [1,16,0,7,0,-1,0,0,0,-1,0,0,0,1, ldraw_lib__4_4ring9()],
// 1 16 0 0 0 10 0 0 0 7 0 0 0 10 4-4cylo.dat
  [1,16,0,0,0,10,0,0,0,7,0,0,0,10, ldraw_lib__4_4cylo()],
];
module ldraw_lib__s__98138s02(step=0, col=false, unit=2/5, alt=false, line=0.2, solid=!$preview)
    makepoly(ldraw_lib__s__98138s02(), step=step, col=col, unit=unit, alt=alt, line=line, solid=solid);
ldraw_lib__s__98138s02(line=0.2);
// file: ../p/4-4ring9.scad
use <../lib.scad>
function ldraw_lib__4_4ring9() = [
// 0 Ring  9 x 1.0
// 0 Name: 4-4ring9.dat
// 0 Author: Magnus Forsberg [MagFors]
// 0 !LDRAW_ORG Primitive UPDATE 2024-01
// 0 !LICENSE Licensed under CC BY 4.0 : see CAreadme.txt
// 
// 0 BFC CERTIFY CCW
  [0,"BFC","CERTIFY"],
  [0,"BFC","CCW"],
// 
// 0 !HISTORY 2004-04-22 [PTadmin] Official Update 2004-02
// 0 !HISTORY 2007-06-24 [PTadmin] Header formatted for Contributor Agreement
// 0 !HISTORY 2008-07-01 [PTadmin] Official Update 2008-01
// 0 !HISTORY 2024-01-04 [MagFors] Complete regeneration, original by jriley
// 0 !HISTORY 2024-01-29 [OrionP] Official Update 2024-01
// 
// 4 16 10 0 0 9.239 0 3.827 8.3151 0 3.4443 9 0 0
  [4,16,10,0,0,9.239,0,3.827,8.3151,0,3.4443,9,0,0],
// 4 16 9.239 0 3.827 7.071 0 7.071 6.3639 0 6.3639 8.3151 0 3.4443
  [4,16,9.239,0,3.827,7.071,0,7.071,6.3639,0,6.3639,8.3151,0,3.4443],
// 4 16 7.071 0 7.071 3.827 0 9.239 3.4443 0 8.3151 6.3639 0 6.3639
  [4,16,7.071,0,7.071,3.827,0,9.239,3.4443,0,8.3151,6.3639,0,6.3639],
// 4 16 3.827 0 9.239 0 0 10 0 0 9 3.4443 0 8.3151
  [4,16,3.827,0,9.239,0,0,10,0,0,9,3.4443,0,8.3151],
// 4 16 0 0 10 -3.827 0 9.239 -3.4443 0 8.3151 0 0 9
  [4,16,0,0,10,-3.827,0,9.239,-3.4443,0,8.3151,0,0,9],
// 4 16 -3.827 0 9.239 -7.071 0 7.071 -6.3639 0 6.3639 -3.4443 0 8.3151
  [4,16,-3.827,0,9.239,-7.071,0,7.071,-6.3639,0,6.3639,-3.4443,0,8.3151],
// 4 16 -7.071 0 7.071 -9.239 0 3.827 -8.3151 0 3.4443 -6.3639 0 6.3639
  [4,16,-7.071,0,7.071,-9.239,0,3.827,-8.3151,0,3.4443,-6.3639,0,6.3639],
// 4 16 -9.239 0 3.827 -10 0 0 -9 0 0 -8.3151 0 3.4443
  [4,16,-9.239,0,3.827,-10,0,0,-9,0,0,-8.3151,0,3.4443],
// 4 16 -10 0 0 -9.239 0 -3.827 -8.3151 0 -3.4443 -9 0 0
  [4,16,-10,0,0,-9.239,0,-3.827,-8.3151,0,-3.4443,-9,0,0],
// 4 16 -9.239 0 -3.827 -7.071 0 -7.071 -6.3639 0 -6.3639 -8.3151 0 -3.4443
  [4,16,-9.239,0,-3.827,-7.071,0,-7.071,-6.3639,0,-6.3639,-8.3151,0,-3.4443],
// 4 16 -7.071 0 -7.071 -3.827 0 -9.239 -3.4443 0 -8.3151 -6.3639 0 -6.3639
  [4,16,-7.071,0,-7.071,-3.827,0,-9.239,-3.4443,0,-8.3151,-6.3639,0,-6.3639],
// 4 16 -3.827 0 -9.239 0 0 -10 0 0 -9 -3.4443 0 -8.3151
  [4,16,-3.827,0,-9.239,0,0,-10,0,0,-9,-3.4443,0,-8.3151],
// 4 16 0 0 -10 3.827 0 -9.239 3.4443 0 -8.3151 0 0 -9
  [4,16,0,0,-10,3.827,0,-9.239,3.4443,0,-8.3151,0,0,-9],
// 4 16 3.827 0 -9.239 7.071 0 -7.071 6.3639 0 -6.3639 3.4443 0 -8.3151
  [4,16,3.827,0,-9.239,7.071,0,-7.071,6.3639,0,-6.3639,3.4443,0,-8.3151],
// 4 16 7.071 0 -7.071 9.239 0 -3.827 8.3151 0 -3.4443 6.3639 0 -6.3639
  [4,16,7.071,0,-7.071,9.239,0,-3.827,8.3151,0,-3.4443,6.3639,0,-6.3639],
// 4 16 9.239 0 -3.827 10 0 0 9 0 0 8.3151 0 -3.4443
  [4,16,9.239,0,-3.827,10,0,0,9,0,0,8.3151,0,-3.4443],
// 0 // Build by LDPartEditor (PrimGen 2.X)
];
module ldraw_lib__4_4ring9(step=0, col=false, unit=2/5, alt=false, line=0.2, solid=!$preview)
    makepoly(ldraw_lib__4_4ring9(), step=step, col=col, unit=unit, alt=alt, line=line, solid=solid);
ldraw_lib__4_4ring9(line=0.2);
// file: ../p/1-16chrd.scad
use <../lib.scad>
use <empty.scad>
function ldraw_lib__1_16chrd() = [
// 0 Chord 0.0625
// 0 Name: 1-16chrd.dat
// 0 Author: Philippe Hurbain [Philo]
// 0 !LDRAW_ORG Primitive UPDATE 2015-01
// 0 !LICENSE Licensed under CC BY 4.0 : see CAreadme.txt
// 
// 0 BFC CERTIFY CCW
  [0,"BFC","CERTIFY"],
  [0,"BFC","CCW"],
// 
// 0 !HISTORY 2015-10-11 [PTadmin] Official Update 2015-01
// 
// 
// 0 // This file is intentionally empty because at the current \P resolution,
// 0 // an 1-16chrd is actually empty. However, this file still is present
// 0 // to allow tools to do primitives substition and fill in a real chrd here,
// 0 // or, if desired, to substitute this with the hi-res 48\1-16chrd.
// 
// 0 // This file is based on an idea by Darats at http://forums.ldraw.org/read.php?19,14500,14500#msg-14500
// 
// 1 16 0 0 0 1 0 0 0 1 0 0 0 1 empty.dat
  [1,16,0,0,0,1,0,0,0,1,0,0,0,1, ldraw_lib__empty()],
];
module ldraw_lib__1_16chrd(step=0, col=false, unit=2/5, alt=false, line=0.2, solid=!$preview)
    makepoly(ldraw_lib__1_16chrd(), step=step, col=col, unit=unit, alt=alt, line=line, solid=solid);
ldraw_lib__1_16chrd(line=0.2);
// file: s/98138s01.scad
use <../../lib.scad>
use <../../p/4-4ring9.scad>
use <98138s02.scad>
function ldraw_lib__s__98138s01() = [
// 0 ~Tile  1 x  1 Round with Groove with Partial Top Face
// 0 Name: s\98138s01.dat
// 0 Author: Magnus Forsberg [MagFors]
// 0 !LDRAW_ORG Subpart UPDATE 2020-01
// 0 !LICENSE Licensed under CC BY 4.0 : see CAreadme.txt
// 
// 0 BFC CERTIFY CCW
  [0,"BFC","CERTIFY"],
  [0,"BFC","CCW"],
// 
// 0 !HISTORY 2011-12-29 [PTadmin] Official Update 2011-02
// 0 !HISTORY 2016-06-17 [MagFors] Reduced the rounded edge to 0.5 ldu
// 0 !HISTORY 2016-12-31 [PTadmin] Official Update 2016-01
// 0 !HISTORY 2019-06-17 [MagFors] Removed the rounded edge
// 0 !HISTORY 2019-07-19 [MagFors] Subfiled without top surface
// 0 !HISTORY 2020-06-28 [PTadmin] Official Update 2020-01
// 
// 
// 1 16 0 0 0 1 0 0 0 1 0 0 0 1 s\98138s02.dat
  [1,16,0,0,0,1,0,0,0,1,0,0,0,1, ldraw_lib__s__98138s02()],
// 1 16 0 0 0 1 0 0 0 1 0 0 0 1 4-4ring9.dat
  [1,16,0,0,0,1,0,0,0,1,0,0,0,1, ldraw_lib__4_4ring9()],
];
module ldraw_lib__s__98138s01(step=0, col=false, unit=2/5, alt=false, line=0.2, solid=!$preview)
    makepoly(ldraw_lib__s__98138s01(), step=step, col=col, unit=unit, alt=alt, line=line, solid=solid);
ldraw_lib__s__98138s01(line=0.2);
// file: ../p/4-4ering.scad
use <../lib.scad>
use <1-16chrd.scad>
function ldraw_lib__4_4ering() = [
// 0 Adapter Ring Triangles to Normal 1.0
// 0 Name: 4-4ering.dat
// 0 Author: Philippe Hurbain [Philo]
// 0 !LDRAW_ORG Primitive UPDATE 2015-01
// 0 !LICENSE Licensed under CC BY 4.0 : see CAreadme.txt
// 
// 0 BFC CERTIFY CCW
  [0,"BFC","CERTIFY"],
  [0,"BFC","CCW"],
// 
// 0 !HISTORY 2015-10-11 [PTadmin] Official Update 2015-01
// 
// 
// 0 // This file uses 1-16chrd (actually empty). It allows
// 0 // tools to do primitives substition and fill in a ring of chrd here,
// 0 // or, if desired, to substitute this with the hi-res 48\1-16chrd.
// 0 // This file is based on an idea by Darats at http://forums.ldraw.org/read.php?19,14500,14500#msg-14500
// 
// 1 16 0 0 0 1 0 0 0 1 0 0 0 1 1-16chrd.dat
  [1,16,0,0,0,1,0,0,0,1,0,0,0,1, ldraw_lib__1_16chrd()],
// 1 16 0 0 0 0.92388 0 0.38268 0 1 0 -0.38268 0 0.92388 1-16chrd.dat
  [1,16,0,0,0,0.92388,0,0.38268,0,1,0,-0.38268,0,0.92388, ldraw_lib__1_16chrd()],
// 1 16 0 0 0 0.70711 0 0.70711 0 1 0 -0.70711 0 0.70711 1-16chrd.dat
  [1,16,0,0,0,0.70711,0,0.70711,0,1,0,-0.70711,0,0.70711, ldraw_lib__1_16chrd()],
// 1 16 0 0 0 0.38268 0 0.92388 0 1 0 -0.92388 0 0.38268 1-16chrd.dat
  [1,16,0,0,0,0.38268,0,0.92388,0,1,0,-0.92388,0,0.38268, ldraw_lib__1_16chrd()],
// 1 16 0 0 0 0 0 1 0 1 0 -1 0 0 1-16chrd.dat
  [1,16,0,0,0,0,0,1,0,1,0,-1,0,0, ldraw_lib__1_16chrd()],
// 1 16 0 0 0 -0.38268 0 0.92388 0 1 0 -0.92388 0 -0.38268 1-16chrd.dat
  [1,16,0,0,0,-0.38268,0,0.92388,0,1,0,-0.92388,0,-0.38268, ldraw_lib__1_16chrd()],
// 1 16 0 0 0 -0.70711 0 0.70711 0 1 0 -0.70711 0 -0.70711 1-16chrd.dat
  [1,16,0,0,0,-0.70711,0,0.70711,0,1,0,-0.70711,0,-0.70711, ldraw_lib__1_16chrd()],
// 1 16 0 0 0 -0.92388 0 0.38268 0 1 0 -0.38268 0 -0.92388 1-16chrd.dat
  [1,16,0,0,0,-0.92388,0,0.38268,0,1,0,-0.38268,0,-0.92388, ldraw_lib__1_16chrd()],
// 1 16 0 0 0 0 0 -1 0 1 0 1 0 0 1-16chrd.dat
  [1,16,0,0,0,0,0,-1,0,1,0,1,0,0, ldraw_lib__1_16chrd()],
// 1 16 0 0 0 0.38268 0 -0.92388 0 1 0 0.92388 0 0.38268 1-16chrd.dat
  [1,16,0,0,0,0.38268,0,-0.92388,0,1,0,0.92388,0,0.38268, ldraw_lib__1_16chrd()],
// 1 16 0 0 0 0.70711 0 -0.70711 0 1 0 0.70711 0 0.70711 1-16chrd.dat
  [1,16,0,0,0,0.70711,0,-0.70711,0,1,0,0.70711,0,0.70711, ldraw_lib__1_16chrd()],
// 1 16 0 0 0 0.92388 0 -0.38268 0 1 0 0.38268 0 0.92388 1-16chrd.dat
  [1,16,0,0,0,0.92388,0,-0.38268,0,1,0,0.38268,0,0.92388, ldraw_lib__1_16chrd()],
// 1 16 0 0 0 -1 0 0 0 1 0 0 0 -1 1-16chrd.dat
  [1,16,0,0,0,-1,0,0,0,1,0,0,0,-1, ldraw_lib__1_16chrd()],
// 1 16 0 0 0 -0.92388 0 -0.38268 0 1 0 0.38268 0 -0.92388 1-16chrd.dat
  [1,16,0,0,0,-0.92388,0,-0.38268,0,1,0,0.38268,0,-0.92388, ldraw_lib__1_16chrd()],
// 1 16 0 0 0 -0.70711 0 -0.70711 0 1 0 0.70711 0 -0.70711 1-16chrd.dat
  [1,16,0,0,0,-0.70711,0,-0.70711,0,1,0,0.70711,0,-0.70711, ldraw_lib__1_16chrd()],
// 1 16 0 0 0 -0.38268 0 -0.92388 0 1 0 0.92388 0 -0.38268 1-16chrd.dat
  [1,16,0,0,0,-0.38268,0,-0.92388,0,1,0,0.92388,0,-0.38268, ldraw_lib__1_16chrd()],
];
module ldraw_lib__4_4ering(step=0, col=false, unit=2/5, alt=false, line=0.2, solid=!$preview)
    makepoly(ldraw_lib__4_4ering(), step=step, col=col, unit=unit, alt=alt, line=line, solid=solid);
ldraw_lib__4_4ering(line=0.2);
// main file
use <../lib.scad>
use <../p/4-4ering.scad>
use <s/98138s01.scad>
function ldraw_lib__98138px8() = [
// 0 Tile  1 x  1 Round with Pixelated Blue Squares Pattern
// 0 Name: 98138px8.dat
// 0 Author: Orion Pobursky [OrionP]
// 0 !LDRAW_ORG Part UPDATE 2020-02
// 0 !LICENSE Licensed under CC BY 4.0 : see CAreadme.txt
// 
// 0 BFC CERTIFY CCW
  [0,"BFC","CERTIFY"],
  [0,"BFC","CCW"],
// 
// 0 !KEYWORDS Bricklink 98138pb100, Minecraft, Rebrickable 98138pr0102, Set 21051
// 
// 0 !HISTORY 2020-09-05 [PTadmin] Official Update 2020-02
// 
// 
// 1 16 0 0 0 1 0 0 0 1 0 0 0 1 s\98138s01.dat
  [1,16,0,0,0,1,0,0,0,1,0,0,0,1, ldraw_lib__s__98138s01()],
// 1 16 0 0 0 9 0 0 0 1 0 0 0 9 4-4ering.dat
  [1,16,0,0,0,9,0,0,0,1,0,0,0,9, ldraw_lib__4_4ering()],
// 
// 4 0 0 0 2.8 -2.8 0 0 0 0 -2.8 2.8 0 0
  [4,0,0,0,2.8,-2.8,0,0,0,0,-2.8,2.8,0,0],
// 3 0 0 0 2.8 -2.8 0 2.8 -2.8 0 0
  [3,0,0,0,2.8,-2.8,0,2.8,-2.8,0,0],
// 3 0 2.8 0 2.8 0 0 2.8 2.8 0 0
  [3,0,2.8,0,2.8,0,0,2.8,2.8,0,0],
// 3 0 2.8 0 0 0 0 -2.8 2.8 0 -2.8
  [3,0,2.8,0,0,0,0,-2.8,2.8,0,-2.8],
// 3 0 -2.8 0 0 -2.8 0 -2.8 0 0 -2.8
  [3,0,-2.8,0,0,-2.8,0,-2.8,0,0,-2.8],
// 4 15 -5.6 0 2.8 -5.6 0 0 -2.8 0 0 -2.8 0 2.8
  [4,15,-5.6,0,2.8,-5.6,0,0,-2.8,0,0,-2.8,0,2.8],
// 4 15 0 0 5.6 -2.8 0 5.6 -2.8 0 2.8 0 0 2.8
  [4,15,0,0,5.6,-2.8,0,5.6,-2.8,0,2.8,0,0,2.8],
// 4 15 5.6 0 -5.6 5.6 0 -2.8 2.8 0 -2.8 2.8 0 -5.6
  [4,15,5.6,0,-5.6,5.6,0,-2.8,2.8,0,-2.8,2.8,0,-5.6],
// 4 321 -5.6 0 -2.8 -2.8 0 -2.8 -2.8 0 0 -5.6 0 0
  [4,321,-5.6,0,-2.8,-2.8,0,-2.8,-2.8,0,0,-5.6,0,0],
// 4 321 0 0 5.6 0 0 2.8 2.8 0 2.8 2.8 0 5.6
  [4,321,0,0,5.6,0,0,2.8,2.8,0,2.8,2.8,0,5.6],
// 4 321 5.6 0 -2.8 5.6 0 0 2.8 0 0 2.8 0 -2.8
  [4,321,5.6,0,-2.8,5.6,0,0,2.8,0,0,2.8,0,-2.8],
// 4 321 0 0 -5.6 2.8 0 -5.6 2.8 0 -2.8 0 0 -2.8
  [4,321,0,0,-5.6,2.8,0,-5.6,2.8,0,-2.8,0,0,-2.8],
// 4 16 -5.6 0 2.8 -2.8 0 2.8 -2.8 0 5.6 -6.3639 0 6.3639
  [4,16,-5.6,0,2.8,-2.8,0,2.8,-2.8,0,5.6,-6.3639,0,6.3639],
// 4 16 2.8 0 2.8 2.8 0 0 5.6 0 0 8.3151 0 3.4443
  [4,16,2.8,0,2.8,2.8,0,0,5.6,0,0,8.3151,0,3.4443],
// 4 16 0 0 -5.6 0 0 -2.8 -2.8 0 -2.8 -3.4443 0 -8.3151
  [4,16,0,0,-5.6,0,0,-2.8,-2.8,0,-2.8,-3.4443,0,-8.3151],
// 4 16 0 0 -5.6 -3.4443 0 -8.3151 0 0 -9 3.4443 0 -8.3151
  [4,16,0,0,-5.6,-3.4443,0,-8.3151,0,0,-9,3.4443,0,-8.3151],
// 4 16 -6.3639 0 -6.3639 -3.4443 0 -8.3151 -2.8 0 -2.8 -5.6 0 -2.8
  [4,16,-6.3639,0,-6.3639,-3.4443,0,-8.3151,-2.8,0,-2.8,-5.6,0,-2.8],
// 4 16 -8.3151 0 -3.4443 -6.3639 0 -6.3639 -5.6 0 -2.8 -5.6 0 0
  [4,16,-8.3151,0,-3.4443,-6.3639,0,-6.3639,-5.6,0,-2.8,-5.6,0,0],
// 4 16 -9 0 0 -8.3151 0 -3.4443 -5.6 0 0 -5.6 0 2.8
  [4,16,-9,0,0,-8.3151,0,-3.4443,-5.6,0,0,-5.6,0,2.8],
// 4 16 -8.3151 0 3.4443 -9 0 0 -5.6 0 2.8 -6.3639 0 6.3639
  [4,16,-8.3151,0,3.4443,-9,0,0,-5.6,0,2.8,-6.3639,0,6.3639],
// 4 16 -3.4443 0 8.3151 -6.3639 0 6.3639 -2.8 0 5.6 0 0 5.6
  [4,16,-3.4443,0,8.3151,-6.3639,0,6.3639,-2.8,0,5.6,0,0,5.6],
// 4 16 0 0 9 -3.4443 0 8.3151 0 0 5.6 2.8 0 5.6
  [4,16,0,0,9,-3.4443,0,8.3151,0,0,5.6,2.8,0,5.6],
// 4 16 3.4443 0 8.3151 0 0 9 2.8 0 5.6 6.3639 0 6.3639
  [4,16,3.4443,0,8.3151,0,0,9,2.8,0,5.6,6.3639,0,6.3639],
// 4 16 6.3639 0 6.3639 2.8 0 5.6 2.8 0 2.8 8.3151 0 3.4443
  [4,16,6.3639,0,6.3639,2.8,0,5.6,2.8,0,2.8,8.3151,0,3.4443],
// 4 16 9 0 0 8.3151 0 3.4443 5.6 0 0 5.6 0 -2.8
  [4,16,9,0,0,8.3151,0,3.4443,5.6,0,0,5.6,0,-2.8],
// 4 16 8.3151 0 -3.4443 9 0 0 5.6 0 -2.8 5.6 0 -5.6
  [4,16,8.3151,0,-3.4443,9,0,0,5.6,0,-2.8,5.6,0,-5.6],
// 3 16 8.3151 0 -3.4443 5.6 0 -5.6 6.3639 0 -6.3639
  [3,16,8.3151,0,-3.4443,5.6,0,-5.6,6.3639,0,-6.3639],
// 4 16 6.3639 0 -6.3639 5.6 0 -5.6 2.8 0 -5.6 3.4443 0 -8.3151
  [4,16,6.3639,0,-6.3639,5.6,0,-5.6,2.8,0,-5.6,3.4443,0,-8.3151],
// 3 16 2.8 0 -5.6 0 0 -5.6 3.4443 0 -8.3151
  [3,16,2.8,0,-5.6,0,0,-5.6,3.4443,0,-8.3151],
];
module ldraw_lib__98138px8(step=0, col=false, unit=2/5, alt=false, line=0.2, solid=!$preview)
    makepoly(ldraw_lib__98138px8(), step=step, col=col, unit=unit, alt=alt, line=line, solid=solid);
ldraw_lib__98138px8(line=0.2);
